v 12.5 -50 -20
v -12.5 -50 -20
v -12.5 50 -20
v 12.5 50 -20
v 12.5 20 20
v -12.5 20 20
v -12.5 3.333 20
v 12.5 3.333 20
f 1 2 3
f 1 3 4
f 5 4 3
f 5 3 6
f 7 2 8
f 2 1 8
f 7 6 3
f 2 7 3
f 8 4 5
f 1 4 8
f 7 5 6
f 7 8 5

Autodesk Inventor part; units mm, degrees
ref_plane "YZ Plane" through (0, 0, 0) normal (1, 0, 0) x (0, 1, 0)
ref_plane "XZ Plane" through (0, 0, 0) normal (0, 1, 0) x (-1, 0, 0)
ref_plane "XY Plane" through (0, 0, 0) normal (0, 0, 1) x (1, 0, 0)
sketch "Esboço1" plane through (0, 0, 0) normal (0, 1, 0) x (-1, 0, 0)
  line L0 (-12.5, 20) -> (12.5, 20)
  line L1 (12.5, 20) -> (12.5, -20)
  line L2 (12.5, -20) -> (-12.5, -20)
  line L3 (-12.5, -20) -> (-12.5, 20)
  line L4 (-12.5, 20) -> (12.5, -20) construction
  line L5 (12.5, 20) -> (-12.5, -20) construction
  point P0 (0, 0)
  dimension "lenght" = 25
  dimension "widht" = 40
extrude "Extrusão1" add sketch "Esboço1" along normal mid plane 100
sketch "Esboço2" plane through (12.5, -50, -20) normal (1, 0, 0) x (0, 0, -1)
  line L0 (0, 100) -> (0, 0) projected
  line L1 (0, 100) -> (-40, 70)
  line L2 (-40, 0) -> (-40, 100) projected
  line L3 (-40, 70) -> (-40, 100)
  line L4 (-40, 100) -> (0, 100)
  point P0 (-20, 50)
  dimension "d4" = 50
extrude "Extrusão2" cut sketch "Esboço2" against normal blind 25
sketch "Esboço3" plane through (12.5, -50, 20) normal (1, 0, 0) x (0, 0, -1)
  line L0 (0, 0) -> (40, 0) projected
  line L1 (40, 0) -> (0, 53.3331)
  line L2 (0, 70) -> (0, 0) projected
  line L3 (0, 53.3331) -> (0, 0)
  line L4 (0, 0) -> (40, 0)
  point P0 (20, 50)
  dimension "d7" = 36.87
extrude "Extrusão3" cut sketch "Esboço3" against normal blind 25
equation "\"lenght\" = RIP_L"
equation "\"widht\" = RIP_H"
equation "\"d5\" = RIP_L"
equation "\"d8\" = RIP_L"
equation "\"RIP_H\" = 40"
equation "\"RIP_L\" = 25"
properties part number "feet" material "Madeira"
